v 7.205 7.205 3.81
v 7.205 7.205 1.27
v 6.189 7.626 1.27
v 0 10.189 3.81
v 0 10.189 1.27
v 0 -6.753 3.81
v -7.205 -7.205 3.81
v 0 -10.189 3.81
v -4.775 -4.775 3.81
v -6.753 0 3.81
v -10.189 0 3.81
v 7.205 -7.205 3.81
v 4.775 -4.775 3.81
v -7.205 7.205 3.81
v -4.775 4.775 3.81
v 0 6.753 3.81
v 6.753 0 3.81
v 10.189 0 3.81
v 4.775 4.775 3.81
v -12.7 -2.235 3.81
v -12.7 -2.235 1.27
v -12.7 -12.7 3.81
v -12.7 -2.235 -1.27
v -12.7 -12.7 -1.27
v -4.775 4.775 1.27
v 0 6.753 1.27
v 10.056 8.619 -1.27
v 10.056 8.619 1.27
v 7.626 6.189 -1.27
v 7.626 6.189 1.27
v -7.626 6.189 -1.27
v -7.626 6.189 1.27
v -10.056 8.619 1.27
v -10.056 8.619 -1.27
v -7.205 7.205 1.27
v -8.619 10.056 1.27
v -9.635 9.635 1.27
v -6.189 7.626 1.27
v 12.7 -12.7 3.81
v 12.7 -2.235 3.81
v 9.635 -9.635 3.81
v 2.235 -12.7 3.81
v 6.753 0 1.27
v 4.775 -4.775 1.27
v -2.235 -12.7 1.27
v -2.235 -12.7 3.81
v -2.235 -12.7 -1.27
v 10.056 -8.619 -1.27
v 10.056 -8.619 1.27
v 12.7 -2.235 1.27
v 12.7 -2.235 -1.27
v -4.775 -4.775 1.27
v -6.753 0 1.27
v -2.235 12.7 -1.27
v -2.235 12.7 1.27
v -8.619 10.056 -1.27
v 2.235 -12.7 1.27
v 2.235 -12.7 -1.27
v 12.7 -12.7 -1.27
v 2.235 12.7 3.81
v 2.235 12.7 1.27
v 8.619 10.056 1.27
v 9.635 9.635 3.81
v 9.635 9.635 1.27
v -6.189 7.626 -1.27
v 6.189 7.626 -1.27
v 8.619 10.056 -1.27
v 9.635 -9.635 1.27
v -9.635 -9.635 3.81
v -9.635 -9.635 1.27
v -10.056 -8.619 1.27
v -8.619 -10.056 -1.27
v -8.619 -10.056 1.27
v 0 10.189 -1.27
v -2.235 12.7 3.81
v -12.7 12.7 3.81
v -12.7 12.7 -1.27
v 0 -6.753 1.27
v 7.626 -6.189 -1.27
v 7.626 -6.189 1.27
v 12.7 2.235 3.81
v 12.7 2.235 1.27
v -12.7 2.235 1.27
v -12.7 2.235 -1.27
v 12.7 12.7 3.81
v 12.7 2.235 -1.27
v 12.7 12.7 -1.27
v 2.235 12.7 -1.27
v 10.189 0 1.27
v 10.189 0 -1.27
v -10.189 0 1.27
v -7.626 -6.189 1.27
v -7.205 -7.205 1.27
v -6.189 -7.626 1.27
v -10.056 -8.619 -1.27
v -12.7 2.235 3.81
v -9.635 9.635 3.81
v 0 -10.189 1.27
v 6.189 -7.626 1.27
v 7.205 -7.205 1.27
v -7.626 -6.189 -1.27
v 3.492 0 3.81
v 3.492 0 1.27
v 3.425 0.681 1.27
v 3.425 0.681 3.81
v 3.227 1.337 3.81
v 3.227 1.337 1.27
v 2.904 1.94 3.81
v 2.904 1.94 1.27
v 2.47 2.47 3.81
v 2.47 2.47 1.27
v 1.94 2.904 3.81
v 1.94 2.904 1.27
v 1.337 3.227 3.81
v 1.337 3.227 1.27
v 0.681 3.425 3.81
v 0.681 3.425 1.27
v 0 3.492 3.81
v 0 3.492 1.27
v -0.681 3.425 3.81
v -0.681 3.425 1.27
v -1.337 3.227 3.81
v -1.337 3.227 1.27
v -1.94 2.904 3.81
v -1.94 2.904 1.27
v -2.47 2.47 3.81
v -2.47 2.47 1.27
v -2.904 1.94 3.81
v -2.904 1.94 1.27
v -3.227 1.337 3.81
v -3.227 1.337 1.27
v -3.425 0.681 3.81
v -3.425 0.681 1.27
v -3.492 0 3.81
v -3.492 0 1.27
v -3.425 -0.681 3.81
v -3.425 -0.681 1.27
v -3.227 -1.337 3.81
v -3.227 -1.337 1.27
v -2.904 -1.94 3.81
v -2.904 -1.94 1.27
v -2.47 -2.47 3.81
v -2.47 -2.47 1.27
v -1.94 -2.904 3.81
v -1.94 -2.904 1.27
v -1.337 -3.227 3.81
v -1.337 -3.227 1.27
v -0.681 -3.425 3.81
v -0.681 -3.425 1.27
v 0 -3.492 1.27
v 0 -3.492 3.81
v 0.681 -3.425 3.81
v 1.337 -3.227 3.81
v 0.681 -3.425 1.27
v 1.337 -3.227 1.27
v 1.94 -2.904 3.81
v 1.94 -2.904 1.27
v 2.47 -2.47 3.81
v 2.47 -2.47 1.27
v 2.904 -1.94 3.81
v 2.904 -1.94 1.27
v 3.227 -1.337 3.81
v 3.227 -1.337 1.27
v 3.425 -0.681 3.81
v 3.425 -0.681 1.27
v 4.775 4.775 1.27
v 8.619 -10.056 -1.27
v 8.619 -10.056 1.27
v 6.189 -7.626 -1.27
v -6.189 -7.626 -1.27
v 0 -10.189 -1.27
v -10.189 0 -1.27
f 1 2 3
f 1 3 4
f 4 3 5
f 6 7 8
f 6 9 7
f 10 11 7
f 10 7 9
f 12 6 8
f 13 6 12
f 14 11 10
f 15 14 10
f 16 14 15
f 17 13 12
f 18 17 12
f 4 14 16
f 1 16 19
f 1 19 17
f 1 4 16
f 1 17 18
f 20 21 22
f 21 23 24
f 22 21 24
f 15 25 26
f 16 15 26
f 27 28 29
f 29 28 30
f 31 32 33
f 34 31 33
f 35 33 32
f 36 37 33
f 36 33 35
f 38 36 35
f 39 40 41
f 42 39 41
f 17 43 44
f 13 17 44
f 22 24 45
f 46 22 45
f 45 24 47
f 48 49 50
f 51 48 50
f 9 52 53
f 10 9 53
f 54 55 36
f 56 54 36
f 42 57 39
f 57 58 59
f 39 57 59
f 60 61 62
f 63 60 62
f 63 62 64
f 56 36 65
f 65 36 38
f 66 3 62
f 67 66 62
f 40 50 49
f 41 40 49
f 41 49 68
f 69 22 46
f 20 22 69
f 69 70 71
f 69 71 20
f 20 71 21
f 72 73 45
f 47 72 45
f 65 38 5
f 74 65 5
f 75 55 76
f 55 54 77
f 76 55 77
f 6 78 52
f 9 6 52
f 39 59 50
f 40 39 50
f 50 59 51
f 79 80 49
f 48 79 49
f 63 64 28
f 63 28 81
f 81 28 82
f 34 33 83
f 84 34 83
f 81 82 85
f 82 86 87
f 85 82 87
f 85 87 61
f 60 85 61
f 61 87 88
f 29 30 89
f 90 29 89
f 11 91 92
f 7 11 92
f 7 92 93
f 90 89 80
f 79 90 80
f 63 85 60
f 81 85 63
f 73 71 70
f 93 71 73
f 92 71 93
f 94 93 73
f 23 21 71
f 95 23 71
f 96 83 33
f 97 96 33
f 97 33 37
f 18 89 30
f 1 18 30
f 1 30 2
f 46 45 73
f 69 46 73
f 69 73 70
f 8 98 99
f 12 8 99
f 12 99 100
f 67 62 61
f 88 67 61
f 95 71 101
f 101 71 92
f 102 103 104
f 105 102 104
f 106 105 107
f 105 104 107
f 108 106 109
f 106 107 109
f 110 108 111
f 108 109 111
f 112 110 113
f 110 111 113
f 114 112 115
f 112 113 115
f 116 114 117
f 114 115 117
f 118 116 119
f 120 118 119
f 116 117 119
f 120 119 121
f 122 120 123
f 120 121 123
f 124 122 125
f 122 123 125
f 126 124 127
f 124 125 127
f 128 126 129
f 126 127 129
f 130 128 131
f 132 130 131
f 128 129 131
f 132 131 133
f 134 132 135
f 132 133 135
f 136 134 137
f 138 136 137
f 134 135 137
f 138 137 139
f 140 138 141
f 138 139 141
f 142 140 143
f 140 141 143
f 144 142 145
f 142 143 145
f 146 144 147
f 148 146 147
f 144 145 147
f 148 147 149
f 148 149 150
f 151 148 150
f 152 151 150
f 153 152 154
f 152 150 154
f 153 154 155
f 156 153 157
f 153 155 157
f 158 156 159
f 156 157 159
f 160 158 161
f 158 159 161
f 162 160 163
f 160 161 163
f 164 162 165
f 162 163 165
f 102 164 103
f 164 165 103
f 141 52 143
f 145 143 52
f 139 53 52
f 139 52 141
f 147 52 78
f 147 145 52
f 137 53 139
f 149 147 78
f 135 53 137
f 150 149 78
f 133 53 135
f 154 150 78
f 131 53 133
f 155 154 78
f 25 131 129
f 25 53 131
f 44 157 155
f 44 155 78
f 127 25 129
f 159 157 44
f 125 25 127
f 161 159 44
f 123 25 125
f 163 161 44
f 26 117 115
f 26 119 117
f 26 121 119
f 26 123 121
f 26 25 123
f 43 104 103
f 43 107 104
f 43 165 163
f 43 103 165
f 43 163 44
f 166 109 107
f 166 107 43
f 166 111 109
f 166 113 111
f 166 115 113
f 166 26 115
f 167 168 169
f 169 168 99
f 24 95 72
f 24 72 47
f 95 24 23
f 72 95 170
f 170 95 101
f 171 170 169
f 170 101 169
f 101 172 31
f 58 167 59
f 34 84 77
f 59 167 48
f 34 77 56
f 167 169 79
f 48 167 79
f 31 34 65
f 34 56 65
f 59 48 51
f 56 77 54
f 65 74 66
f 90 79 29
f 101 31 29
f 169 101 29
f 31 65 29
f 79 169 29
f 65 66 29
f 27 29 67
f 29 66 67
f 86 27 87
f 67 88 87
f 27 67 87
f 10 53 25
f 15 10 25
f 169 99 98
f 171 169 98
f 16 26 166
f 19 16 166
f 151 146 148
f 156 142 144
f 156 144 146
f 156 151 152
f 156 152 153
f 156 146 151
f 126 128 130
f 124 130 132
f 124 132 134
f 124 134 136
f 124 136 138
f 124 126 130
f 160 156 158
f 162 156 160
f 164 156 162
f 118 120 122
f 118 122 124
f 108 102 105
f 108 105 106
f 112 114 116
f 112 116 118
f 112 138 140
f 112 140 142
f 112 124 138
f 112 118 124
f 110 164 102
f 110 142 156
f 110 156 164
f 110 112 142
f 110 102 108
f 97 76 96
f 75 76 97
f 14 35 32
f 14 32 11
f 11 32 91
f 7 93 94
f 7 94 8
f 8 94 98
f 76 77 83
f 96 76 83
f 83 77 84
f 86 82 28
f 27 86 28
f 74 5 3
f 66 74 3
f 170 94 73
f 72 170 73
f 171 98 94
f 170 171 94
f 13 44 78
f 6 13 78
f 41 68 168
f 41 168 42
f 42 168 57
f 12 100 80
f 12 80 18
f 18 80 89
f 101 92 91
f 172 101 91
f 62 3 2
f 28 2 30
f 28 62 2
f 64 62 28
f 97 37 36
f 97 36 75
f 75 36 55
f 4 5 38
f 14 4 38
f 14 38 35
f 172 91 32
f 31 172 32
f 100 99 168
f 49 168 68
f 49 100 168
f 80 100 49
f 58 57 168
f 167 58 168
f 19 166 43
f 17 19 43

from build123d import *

# Parameters (mm, degrees)
F0_W            = 25.4
F0_H            = 25.4
F1_DEPTH        = 1.27
F3_DEPTH        = 2.54
F2_R            = 3.4925
F4_DEPTH        = 2.54
F5_DEPTH        = 2.54
F5_COPIES_COUNT = 4
F7_DEPTH        = 2.541
F7_COPIES_COUNT = 4


# Not quite as in the source:
# - a pattern or mirror of a feature is missing from the dataset's text; its kind, count and spacing are read off the source's solid


with BuildPart() as f1:
    # F0 (on Top) → F1 (new body, symmetric)
    with BuildSketch(Plane.XY):
        Rectangle(F0_W, F0_H)
    extrude(amount=F1_DEPTH, both=True)

    # F2 (on face) → F3 (join)
    with BuildSketch(Plane.XY.offset(1.27)):
        Polygon((0, 10.1892549187), (-7.2048912482, 7.2048912482), (-10.1892549187, 0), (-7.2048912482, -7.2048912482), (0, -10.1892549187), (7.2048912482, -7.2048912482), (10.1892549187, 0), (7.2048912482, 7.2048912482), align=None)
        Polygon((-4.7748514527, 4.7748514527), (0, 6.7526596828), (4.7748514527, 4.7748514527), (6.7526596828, 0), (4.7748514527, -4.7748514527), (0, -6.7526596828), (-4.7748514527, -4.7748514527), (-6.7526596828, 0), align=None, mode=Mode.SUBTRACT)
    extrude(amount=F3_DEPTH)

    # F2 (on face) → F4 (join, through all)
    with BuildSketch(Plane.XY.offset(1.27)):
        Circle(F2_R)
    extrude(amount=F4_DEPTH)

    # F2 (on face) → F5 (join, through all)
    with BuildSketch(Plane.XY.offset(1.27)):
        Polygon((-2.2352, 12.7), (-12.7, 12.7), (-12.7, 2.2352), (-9.6349310438, 9.6349310438), align=None)
    f5 = extrude(amount=F5_DEPTH)

    # F5_copies: F5 ×4 about axis
    f5_copies_axis = Axis((0, 0, 0), (0, 0, 1))
    for i in range(1, F5_COPIES_COUNT):
        add(f5.rotate(f5_copies_axis, i * 360 / F5_COPIES_COUNT))

    # F6 (on face) → F7 (cut, through all)
    with BuildSketch(Plane.XY.offset(1.27)):
        Polygon((-8.6189310438, 10.0557720231), (-6.1888912482, 7.6257322276), (0, 10.1892549187), (6.1888912482, 7.6257322276), (8.6189310438, 10.0557720231), (2.2352, 12.7), (-2.2352, 12.7), align=None)
    f7 = extrude(amount=-F7_DEPTH, mode=Mode.SUBTRACT)

    # F7_copies: F7 ×4 about axis
    f7_copies_axis = Axis((0, 0, 0), (0, 0, 1))
    for i in range(1, F7_COPIES_COUNT):
        add(f7.rotate(f7_copies_axis, i * 360 / F7_COPIES_COUNT), mode=Mode.SUBTRACT)


solid = f1.part
